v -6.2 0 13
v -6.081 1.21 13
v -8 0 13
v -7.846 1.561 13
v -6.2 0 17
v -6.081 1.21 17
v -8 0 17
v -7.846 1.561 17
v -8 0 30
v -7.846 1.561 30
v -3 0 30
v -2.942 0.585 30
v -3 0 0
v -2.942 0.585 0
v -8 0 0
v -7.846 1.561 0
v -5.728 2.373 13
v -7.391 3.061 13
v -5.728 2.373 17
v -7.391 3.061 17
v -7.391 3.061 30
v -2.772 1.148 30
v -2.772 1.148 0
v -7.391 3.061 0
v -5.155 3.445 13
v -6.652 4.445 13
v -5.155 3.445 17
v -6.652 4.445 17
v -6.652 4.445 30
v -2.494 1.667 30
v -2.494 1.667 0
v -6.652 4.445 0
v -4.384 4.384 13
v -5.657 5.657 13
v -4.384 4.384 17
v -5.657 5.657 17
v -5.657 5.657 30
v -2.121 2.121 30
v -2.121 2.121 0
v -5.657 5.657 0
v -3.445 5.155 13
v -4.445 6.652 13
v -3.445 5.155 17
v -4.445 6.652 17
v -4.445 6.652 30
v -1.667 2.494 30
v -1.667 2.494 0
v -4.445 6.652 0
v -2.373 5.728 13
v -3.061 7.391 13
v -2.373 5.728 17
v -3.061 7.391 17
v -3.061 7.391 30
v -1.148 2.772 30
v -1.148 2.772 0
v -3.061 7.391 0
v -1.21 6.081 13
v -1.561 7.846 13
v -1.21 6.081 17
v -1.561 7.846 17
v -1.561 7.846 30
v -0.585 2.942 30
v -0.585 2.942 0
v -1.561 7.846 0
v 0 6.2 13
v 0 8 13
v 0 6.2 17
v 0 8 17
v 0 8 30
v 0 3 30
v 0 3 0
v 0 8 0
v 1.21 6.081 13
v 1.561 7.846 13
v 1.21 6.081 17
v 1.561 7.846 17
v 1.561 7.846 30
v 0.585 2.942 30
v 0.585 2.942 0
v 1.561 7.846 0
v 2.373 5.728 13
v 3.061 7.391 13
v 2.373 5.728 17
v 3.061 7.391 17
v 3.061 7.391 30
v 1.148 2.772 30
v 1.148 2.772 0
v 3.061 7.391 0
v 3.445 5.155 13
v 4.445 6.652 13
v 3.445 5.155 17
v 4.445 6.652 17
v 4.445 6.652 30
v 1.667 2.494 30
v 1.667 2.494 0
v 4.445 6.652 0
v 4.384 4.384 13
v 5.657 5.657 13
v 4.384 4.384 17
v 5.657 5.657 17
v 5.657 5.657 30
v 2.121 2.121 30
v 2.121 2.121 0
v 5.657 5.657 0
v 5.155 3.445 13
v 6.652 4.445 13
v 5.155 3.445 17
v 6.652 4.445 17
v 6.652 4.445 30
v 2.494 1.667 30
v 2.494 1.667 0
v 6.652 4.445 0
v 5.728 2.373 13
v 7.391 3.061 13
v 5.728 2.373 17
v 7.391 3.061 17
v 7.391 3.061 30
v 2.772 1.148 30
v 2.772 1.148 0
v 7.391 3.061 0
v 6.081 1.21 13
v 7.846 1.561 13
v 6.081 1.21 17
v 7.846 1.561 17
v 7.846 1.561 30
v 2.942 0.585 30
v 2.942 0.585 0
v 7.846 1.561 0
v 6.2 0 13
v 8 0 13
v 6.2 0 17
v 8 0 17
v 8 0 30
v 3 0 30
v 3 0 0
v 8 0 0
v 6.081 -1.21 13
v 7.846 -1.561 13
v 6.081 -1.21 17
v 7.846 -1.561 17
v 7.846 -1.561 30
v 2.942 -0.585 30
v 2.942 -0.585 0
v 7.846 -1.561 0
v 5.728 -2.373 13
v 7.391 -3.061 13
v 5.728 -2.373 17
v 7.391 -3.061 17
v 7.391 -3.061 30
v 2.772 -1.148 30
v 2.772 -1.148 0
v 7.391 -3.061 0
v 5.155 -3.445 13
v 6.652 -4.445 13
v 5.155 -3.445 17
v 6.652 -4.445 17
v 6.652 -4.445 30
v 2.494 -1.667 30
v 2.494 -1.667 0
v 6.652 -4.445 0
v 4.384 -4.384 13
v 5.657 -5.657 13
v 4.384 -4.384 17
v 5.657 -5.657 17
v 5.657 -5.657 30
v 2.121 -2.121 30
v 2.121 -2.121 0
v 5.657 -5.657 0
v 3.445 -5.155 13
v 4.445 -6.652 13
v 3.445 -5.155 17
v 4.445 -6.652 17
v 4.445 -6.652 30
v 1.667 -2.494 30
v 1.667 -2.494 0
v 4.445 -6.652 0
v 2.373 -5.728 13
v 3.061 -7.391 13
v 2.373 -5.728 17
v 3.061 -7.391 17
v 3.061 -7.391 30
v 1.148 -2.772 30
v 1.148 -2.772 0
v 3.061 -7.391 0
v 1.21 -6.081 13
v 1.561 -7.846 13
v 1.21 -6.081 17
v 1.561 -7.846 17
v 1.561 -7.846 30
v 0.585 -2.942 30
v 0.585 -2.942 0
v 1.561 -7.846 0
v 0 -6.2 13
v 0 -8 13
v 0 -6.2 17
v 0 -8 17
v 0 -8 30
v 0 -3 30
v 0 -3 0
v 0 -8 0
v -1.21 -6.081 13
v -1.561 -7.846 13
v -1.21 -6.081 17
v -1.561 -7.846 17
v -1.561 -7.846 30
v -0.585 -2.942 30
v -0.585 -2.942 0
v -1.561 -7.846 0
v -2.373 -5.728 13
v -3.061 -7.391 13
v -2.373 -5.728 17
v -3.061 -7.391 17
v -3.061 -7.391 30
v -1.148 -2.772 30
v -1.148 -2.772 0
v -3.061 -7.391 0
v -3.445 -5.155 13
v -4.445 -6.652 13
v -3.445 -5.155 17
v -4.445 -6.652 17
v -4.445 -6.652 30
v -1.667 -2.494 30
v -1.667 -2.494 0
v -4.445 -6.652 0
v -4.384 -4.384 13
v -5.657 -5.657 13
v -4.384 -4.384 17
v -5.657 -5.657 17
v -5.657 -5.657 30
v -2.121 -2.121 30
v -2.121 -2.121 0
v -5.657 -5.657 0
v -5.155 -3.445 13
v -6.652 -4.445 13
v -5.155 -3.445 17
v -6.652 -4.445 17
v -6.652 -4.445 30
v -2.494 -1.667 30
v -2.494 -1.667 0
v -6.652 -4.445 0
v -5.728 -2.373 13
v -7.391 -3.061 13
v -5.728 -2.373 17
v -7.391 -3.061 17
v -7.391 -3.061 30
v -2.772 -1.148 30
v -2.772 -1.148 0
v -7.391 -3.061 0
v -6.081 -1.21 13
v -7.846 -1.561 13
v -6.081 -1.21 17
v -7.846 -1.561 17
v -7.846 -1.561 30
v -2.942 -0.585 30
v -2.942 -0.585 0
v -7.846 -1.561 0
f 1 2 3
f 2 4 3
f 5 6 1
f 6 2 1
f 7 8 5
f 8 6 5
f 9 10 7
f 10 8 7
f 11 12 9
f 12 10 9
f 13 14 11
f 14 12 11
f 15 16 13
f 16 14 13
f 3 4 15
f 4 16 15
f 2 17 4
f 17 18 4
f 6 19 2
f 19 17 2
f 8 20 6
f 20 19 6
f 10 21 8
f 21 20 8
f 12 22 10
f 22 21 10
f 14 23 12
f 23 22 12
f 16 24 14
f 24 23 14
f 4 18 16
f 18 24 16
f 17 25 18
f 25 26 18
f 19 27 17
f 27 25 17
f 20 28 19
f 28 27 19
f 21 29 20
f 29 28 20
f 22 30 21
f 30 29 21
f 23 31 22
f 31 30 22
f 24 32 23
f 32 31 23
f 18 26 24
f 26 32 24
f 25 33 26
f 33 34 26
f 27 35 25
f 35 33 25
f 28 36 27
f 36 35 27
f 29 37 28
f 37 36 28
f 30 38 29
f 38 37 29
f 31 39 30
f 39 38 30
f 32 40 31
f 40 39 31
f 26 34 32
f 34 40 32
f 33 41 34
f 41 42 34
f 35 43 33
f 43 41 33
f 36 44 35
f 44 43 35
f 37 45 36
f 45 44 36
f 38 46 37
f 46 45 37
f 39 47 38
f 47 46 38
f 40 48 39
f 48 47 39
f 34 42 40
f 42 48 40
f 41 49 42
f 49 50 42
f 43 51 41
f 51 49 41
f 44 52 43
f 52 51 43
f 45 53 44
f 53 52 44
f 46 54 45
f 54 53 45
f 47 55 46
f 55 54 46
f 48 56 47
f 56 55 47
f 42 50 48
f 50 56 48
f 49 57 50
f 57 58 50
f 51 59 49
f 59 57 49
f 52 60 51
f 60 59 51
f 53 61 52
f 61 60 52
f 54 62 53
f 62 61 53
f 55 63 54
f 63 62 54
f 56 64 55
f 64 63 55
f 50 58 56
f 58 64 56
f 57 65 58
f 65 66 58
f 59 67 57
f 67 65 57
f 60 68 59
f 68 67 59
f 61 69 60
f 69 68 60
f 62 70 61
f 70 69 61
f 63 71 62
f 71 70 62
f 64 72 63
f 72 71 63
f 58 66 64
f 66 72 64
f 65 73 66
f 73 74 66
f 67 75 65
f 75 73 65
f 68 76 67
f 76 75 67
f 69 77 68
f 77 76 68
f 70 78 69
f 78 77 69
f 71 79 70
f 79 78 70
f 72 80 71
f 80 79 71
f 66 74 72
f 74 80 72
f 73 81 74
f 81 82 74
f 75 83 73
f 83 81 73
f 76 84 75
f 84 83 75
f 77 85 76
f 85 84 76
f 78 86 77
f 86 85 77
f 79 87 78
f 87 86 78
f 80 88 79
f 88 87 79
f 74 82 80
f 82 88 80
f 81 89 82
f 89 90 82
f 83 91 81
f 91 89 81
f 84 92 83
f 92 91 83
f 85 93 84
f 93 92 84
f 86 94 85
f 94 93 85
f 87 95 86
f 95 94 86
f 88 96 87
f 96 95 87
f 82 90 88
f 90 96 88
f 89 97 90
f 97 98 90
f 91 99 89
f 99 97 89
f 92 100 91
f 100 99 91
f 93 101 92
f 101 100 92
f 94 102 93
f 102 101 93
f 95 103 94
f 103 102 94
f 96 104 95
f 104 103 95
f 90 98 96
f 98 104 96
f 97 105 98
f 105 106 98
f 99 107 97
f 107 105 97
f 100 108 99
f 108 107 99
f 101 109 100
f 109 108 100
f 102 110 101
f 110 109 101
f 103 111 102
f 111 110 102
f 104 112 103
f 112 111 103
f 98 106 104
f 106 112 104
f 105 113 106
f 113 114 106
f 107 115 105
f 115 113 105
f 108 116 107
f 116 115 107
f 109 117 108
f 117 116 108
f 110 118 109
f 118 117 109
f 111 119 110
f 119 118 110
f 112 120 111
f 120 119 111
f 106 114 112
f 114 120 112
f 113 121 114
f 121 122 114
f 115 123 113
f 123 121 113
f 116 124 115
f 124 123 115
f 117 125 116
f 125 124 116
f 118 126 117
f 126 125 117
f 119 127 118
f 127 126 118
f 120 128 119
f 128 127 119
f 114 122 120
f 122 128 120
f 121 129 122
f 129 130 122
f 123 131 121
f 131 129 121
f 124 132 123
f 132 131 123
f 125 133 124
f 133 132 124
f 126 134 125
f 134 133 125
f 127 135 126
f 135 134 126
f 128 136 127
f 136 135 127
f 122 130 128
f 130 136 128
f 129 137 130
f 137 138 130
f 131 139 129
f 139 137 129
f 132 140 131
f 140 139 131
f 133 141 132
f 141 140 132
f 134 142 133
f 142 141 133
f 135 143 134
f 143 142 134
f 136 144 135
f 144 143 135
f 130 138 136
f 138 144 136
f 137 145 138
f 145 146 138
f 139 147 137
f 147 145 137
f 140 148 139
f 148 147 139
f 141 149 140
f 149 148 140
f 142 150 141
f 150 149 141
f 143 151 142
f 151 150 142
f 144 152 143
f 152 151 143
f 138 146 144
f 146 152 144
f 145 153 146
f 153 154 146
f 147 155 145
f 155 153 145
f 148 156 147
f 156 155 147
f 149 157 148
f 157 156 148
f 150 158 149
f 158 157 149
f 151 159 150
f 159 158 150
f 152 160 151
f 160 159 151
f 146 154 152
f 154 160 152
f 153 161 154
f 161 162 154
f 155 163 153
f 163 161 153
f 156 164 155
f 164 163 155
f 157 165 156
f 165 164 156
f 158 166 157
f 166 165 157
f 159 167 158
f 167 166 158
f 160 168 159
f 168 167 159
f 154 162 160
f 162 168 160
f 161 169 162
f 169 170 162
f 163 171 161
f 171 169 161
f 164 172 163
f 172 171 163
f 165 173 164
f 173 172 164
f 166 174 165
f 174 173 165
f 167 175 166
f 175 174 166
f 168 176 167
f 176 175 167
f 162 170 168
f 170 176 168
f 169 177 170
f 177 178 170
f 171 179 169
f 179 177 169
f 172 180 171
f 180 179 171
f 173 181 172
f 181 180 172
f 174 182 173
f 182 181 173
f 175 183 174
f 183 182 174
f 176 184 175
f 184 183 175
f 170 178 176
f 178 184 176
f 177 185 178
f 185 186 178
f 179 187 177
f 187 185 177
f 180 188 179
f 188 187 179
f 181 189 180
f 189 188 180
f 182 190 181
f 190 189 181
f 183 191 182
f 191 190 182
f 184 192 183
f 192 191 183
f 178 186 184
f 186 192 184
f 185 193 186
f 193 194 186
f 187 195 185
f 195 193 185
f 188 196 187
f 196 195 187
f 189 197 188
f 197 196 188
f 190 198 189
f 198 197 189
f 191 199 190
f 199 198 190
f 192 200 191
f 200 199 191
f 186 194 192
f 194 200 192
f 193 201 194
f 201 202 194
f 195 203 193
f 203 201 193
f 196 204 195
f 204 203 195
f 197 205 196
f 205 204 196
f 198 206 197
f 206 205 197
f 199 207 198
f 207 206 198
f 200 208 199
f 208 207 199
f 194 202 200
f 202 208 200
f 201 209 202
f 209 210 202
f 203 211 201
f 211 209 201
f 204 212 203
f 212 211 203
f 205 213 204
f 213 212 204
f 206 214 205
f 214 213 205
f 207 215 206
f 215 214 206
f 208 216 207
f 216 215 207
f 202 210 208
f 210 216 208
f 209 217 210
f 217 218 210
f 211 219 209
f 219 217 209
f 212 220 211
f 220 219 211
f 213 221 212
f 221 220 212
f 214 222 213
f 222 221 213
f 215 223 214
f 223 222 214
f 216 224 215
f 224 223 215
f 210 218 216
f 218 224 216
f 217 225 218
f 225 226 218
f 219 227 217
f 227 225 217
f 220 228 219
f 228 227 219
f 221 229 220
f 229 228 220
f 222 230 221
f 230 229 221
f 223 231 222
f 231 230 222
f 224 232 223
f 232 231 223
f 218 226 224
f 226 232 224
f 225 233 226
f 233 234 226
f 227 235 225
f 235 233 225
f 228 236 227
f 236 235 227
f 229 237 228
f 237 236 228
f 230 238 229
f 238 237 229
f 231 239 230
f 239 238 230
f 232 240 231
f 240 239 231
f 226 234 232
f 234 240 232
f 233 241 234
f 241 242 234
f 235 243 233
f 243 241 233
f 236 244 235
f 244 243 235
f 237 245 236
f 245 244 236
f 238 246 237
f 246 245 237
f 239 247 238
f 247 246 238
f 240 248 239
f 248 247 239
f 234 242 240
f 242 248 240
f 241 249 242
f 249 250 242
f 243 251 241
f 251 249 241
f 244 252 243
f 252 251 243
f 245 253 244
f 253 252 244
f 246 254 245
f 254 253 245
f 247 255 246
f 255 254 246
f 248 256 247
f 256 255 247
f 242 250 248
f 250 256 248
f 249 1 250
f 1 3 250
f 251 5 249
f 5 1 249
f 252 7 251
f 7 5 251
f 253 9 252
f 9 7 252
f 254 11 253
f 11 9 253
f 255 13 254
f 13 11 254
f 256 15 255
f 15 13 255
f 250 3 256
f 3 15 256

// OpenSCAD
$fn = 32;

// ----------------------------------------------------------------------
// Grooved revolve: stepped, bore R3
// ----------------------------------------------------------------------

// --- parameters (mm) ---
bore_r = 3;               // bore radius
outer_r = 8;              // outer radius of the body
total_h = 30;             // overall height, Z
wall = 5;                 // radial wall thickness
groove_w = 4;             // groove width
groove_d = 1.8;           // groove depth
grooves = 1;              // number of outer grooves

bbox_x = 2 * outer_r;  // full diameter
bore_d = 2 * bore_r;  // bore diameter
body_d = 2 * outer_r;  // body diameter
revolve_angle = 360;  // full turn around the Z axis

profile = [[3, 0], [8, 0], [8, 13], [6.2, 13], [6.2, 17], [8, 17], [8, 30], [3, 30]];  // primary outline, 8 points, counter clockwise

// --- the one profile operation ---
rotate_extrude(angle = revolve_angle) polygon(points = profile);
